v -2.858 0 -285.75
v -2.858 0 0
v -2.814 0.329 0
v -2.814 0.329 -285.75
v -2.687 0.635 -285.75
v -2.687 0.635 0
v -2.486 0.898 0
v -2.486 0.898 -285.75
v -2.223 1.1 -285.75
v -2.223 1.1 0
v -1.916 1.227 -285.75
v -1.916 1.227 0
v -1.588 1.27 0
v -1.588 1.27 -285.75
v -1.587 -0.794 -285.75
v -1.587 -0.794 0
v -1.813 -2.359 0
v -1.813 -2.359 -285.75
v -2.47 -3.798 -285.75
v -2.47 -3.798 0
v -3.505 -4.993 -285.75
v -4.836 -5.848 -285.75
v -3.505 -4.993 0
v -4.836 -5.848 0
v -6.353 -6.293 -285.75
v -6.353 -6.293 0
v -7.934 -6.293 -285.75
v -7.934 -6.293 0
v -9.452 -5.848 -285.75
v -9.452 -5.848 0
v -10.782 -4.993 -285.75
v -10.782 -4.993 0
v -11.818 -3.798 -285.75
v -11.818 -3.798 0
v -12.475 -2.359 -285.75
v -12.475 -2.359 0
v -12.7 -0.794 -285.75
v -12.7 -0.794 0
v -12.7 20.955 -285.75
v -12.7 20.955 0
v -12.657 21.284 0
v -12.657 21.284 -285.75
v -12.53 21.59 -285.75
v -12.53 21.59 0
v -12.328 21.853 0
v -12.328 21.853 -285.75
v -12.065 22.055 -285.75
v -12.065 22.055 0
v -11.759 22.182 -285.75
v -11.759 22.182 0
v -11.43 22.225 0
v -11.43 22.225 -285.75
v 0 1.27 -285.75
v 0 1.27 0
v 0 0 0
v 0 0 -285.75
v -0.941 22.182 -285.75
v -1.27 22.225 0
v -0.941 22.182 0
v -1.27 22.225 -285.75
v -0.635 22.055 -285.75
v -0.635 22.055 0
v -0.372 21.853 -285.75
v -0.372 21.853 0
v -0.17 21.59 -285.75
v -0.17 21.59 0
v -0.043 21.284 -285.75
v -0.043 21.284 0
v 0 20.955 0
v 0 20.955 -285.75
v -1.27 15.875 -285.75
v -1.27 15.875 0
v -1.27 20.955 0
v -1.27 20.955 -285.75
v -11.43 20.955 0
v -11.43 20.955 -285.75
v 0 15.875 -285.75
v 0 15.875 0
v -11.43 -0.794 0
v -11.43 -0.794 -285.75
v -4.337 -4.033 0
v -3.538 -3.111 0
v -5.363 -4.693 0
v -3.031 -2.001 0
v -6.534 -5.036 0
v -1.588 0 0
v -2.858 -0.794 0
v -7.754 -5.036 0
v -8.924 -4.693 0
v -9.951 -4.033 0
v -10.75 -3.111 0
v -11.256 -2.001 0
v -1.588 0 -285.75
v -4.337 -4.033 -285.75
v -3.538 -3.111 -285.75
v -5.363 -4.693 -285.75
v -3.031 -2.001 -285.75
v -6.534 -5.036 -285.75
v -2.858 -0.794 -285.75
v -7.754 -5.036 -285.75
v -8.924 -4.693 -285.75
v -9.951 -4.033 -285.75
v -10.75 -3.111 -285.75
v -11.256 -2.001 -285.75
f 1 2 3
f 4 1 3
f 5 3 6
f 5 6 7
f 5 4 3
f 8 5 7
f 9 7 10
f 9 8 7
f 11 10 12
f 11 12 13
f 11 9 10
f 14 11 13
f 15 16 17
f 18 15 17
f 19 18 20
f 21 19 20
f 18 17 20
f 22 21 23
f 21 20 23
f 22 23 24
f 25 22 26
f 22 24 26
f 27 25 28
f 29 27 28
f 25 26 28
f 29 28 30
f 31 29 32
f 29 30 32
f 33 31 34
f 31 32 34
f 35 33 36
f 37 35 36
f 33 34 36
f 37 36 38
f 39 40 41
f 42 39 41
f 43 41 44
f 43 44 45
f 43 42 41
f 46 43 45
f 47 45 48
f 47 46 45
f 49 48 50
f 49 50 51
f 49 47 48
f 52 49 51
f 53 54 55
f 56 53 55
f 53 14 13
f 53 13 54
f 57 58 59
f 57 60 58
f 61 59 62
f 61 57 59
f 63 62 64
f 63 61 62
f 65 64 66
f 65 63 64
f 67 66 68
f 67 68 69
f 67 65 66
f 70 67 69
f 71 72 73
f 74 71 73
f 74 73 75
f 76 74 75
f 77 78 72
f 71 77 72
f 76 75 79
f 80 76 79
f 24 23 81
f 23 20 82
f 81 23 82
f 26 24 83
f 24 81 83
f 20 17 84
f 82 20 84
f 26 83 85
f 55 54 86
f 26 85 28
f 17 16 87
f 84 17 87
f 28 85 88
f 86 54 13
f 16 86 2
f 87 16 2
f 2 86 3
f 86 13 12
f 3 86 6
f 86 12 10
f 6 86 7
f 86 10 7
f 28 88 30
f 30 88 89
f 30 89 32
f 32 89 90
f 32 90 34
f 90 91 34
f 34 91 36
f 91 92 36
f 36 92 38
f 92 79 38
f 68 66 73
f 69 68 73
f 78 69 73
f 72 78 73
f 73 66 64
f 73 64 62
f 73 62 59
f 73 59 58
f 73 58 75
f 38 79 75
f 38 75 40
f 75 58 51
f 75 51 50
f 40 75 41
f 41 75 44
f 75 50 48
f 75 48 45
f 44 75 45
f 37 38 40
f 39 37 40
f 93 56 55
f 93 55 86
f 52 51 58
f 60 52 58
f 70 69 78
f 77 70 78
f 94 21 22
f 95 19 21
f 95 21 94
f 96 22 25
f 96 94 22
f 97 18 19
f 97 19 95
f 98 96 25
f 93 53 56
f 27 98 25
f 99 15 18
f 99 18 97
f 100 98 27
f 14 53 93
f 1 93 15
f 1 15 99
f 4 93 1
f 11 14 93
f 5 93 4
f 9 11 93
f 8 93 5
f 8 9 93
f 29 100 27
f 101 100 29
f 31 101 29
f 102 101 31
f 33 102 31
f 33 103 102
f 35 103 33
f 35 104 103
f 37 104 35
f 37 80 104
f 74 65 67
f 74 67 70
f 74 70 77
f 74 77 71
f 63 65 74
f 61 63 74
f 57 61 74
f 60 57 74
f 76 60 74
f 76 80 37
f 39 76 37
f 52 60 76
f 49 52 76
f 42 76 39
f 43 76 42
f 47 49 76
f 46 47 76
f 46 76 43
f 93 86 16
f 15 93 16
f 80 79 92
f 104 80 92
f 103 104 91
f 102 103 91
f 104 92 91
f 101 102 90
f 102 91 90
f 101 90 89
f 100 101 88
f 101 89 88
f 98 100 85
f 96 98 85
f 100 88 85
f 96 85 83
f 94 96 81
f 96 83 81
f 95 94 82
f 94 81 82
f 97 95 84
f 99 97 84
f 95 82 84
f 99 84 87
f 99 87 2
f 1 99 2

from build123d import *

# Parameters (mm, degrees)
EXTRUDE_THIN1_DEPTH = 285.75
FILLET1_R           = 1.27


with BuildPart() as part:
    # Sketch1 → Extrude-Thin1 (new body)
    with BuildSketch(Plane.XY):
        with BuildLine():
            Line((0, 0), (-1.5875, 0))
            Line((-1.5875, 0), (-1.5875, -0.79375))
            ThreePointArc((-1.5875, -0.79375), (-7.14375, -6.35), (-12.7, -0.79375))
            Line((-12.7, -0.79375), (-12.7, 22.225))
            Line((-12.7, 22.225), (0, 22.225))
            Line((0, 22.225), (0, 15.875))
            Line((0, 15.875), (-1.27, 15.875))
            Line((-1.27, 15.875), (-1.27, 20.955))
            Line((-1.27, 20.955), (-11.43, 20.955))
            Line((-11.43, 20.955), (-11.43, -0.79375))
            ThreePointArc((-11.43, -0.79375), (-7.14375, -5.08), (-2.8575, -0.79375))
            Line((-2.8575, -0.79375), (-2.8575, 1.27))
            Line((-2.8575, 1.27), (0, 1.27))
            Line((0, 1.27), (0, 0))
        make_face()
    extrude(amount=-EXTRUDE_THIN1_DEPTH)

    # Fillet1
    fillet1_edges = [part.edges().sort_by_distance(p)[0] for p in [
        (-2.8575, 1.27, -142.875),
        (-12.7, 22.225, -142.875),
        (0, 22.225, -142.875),
    ]]
    fillet(fillet1_edges, radius=FILLET1_R)


solid = part.part
